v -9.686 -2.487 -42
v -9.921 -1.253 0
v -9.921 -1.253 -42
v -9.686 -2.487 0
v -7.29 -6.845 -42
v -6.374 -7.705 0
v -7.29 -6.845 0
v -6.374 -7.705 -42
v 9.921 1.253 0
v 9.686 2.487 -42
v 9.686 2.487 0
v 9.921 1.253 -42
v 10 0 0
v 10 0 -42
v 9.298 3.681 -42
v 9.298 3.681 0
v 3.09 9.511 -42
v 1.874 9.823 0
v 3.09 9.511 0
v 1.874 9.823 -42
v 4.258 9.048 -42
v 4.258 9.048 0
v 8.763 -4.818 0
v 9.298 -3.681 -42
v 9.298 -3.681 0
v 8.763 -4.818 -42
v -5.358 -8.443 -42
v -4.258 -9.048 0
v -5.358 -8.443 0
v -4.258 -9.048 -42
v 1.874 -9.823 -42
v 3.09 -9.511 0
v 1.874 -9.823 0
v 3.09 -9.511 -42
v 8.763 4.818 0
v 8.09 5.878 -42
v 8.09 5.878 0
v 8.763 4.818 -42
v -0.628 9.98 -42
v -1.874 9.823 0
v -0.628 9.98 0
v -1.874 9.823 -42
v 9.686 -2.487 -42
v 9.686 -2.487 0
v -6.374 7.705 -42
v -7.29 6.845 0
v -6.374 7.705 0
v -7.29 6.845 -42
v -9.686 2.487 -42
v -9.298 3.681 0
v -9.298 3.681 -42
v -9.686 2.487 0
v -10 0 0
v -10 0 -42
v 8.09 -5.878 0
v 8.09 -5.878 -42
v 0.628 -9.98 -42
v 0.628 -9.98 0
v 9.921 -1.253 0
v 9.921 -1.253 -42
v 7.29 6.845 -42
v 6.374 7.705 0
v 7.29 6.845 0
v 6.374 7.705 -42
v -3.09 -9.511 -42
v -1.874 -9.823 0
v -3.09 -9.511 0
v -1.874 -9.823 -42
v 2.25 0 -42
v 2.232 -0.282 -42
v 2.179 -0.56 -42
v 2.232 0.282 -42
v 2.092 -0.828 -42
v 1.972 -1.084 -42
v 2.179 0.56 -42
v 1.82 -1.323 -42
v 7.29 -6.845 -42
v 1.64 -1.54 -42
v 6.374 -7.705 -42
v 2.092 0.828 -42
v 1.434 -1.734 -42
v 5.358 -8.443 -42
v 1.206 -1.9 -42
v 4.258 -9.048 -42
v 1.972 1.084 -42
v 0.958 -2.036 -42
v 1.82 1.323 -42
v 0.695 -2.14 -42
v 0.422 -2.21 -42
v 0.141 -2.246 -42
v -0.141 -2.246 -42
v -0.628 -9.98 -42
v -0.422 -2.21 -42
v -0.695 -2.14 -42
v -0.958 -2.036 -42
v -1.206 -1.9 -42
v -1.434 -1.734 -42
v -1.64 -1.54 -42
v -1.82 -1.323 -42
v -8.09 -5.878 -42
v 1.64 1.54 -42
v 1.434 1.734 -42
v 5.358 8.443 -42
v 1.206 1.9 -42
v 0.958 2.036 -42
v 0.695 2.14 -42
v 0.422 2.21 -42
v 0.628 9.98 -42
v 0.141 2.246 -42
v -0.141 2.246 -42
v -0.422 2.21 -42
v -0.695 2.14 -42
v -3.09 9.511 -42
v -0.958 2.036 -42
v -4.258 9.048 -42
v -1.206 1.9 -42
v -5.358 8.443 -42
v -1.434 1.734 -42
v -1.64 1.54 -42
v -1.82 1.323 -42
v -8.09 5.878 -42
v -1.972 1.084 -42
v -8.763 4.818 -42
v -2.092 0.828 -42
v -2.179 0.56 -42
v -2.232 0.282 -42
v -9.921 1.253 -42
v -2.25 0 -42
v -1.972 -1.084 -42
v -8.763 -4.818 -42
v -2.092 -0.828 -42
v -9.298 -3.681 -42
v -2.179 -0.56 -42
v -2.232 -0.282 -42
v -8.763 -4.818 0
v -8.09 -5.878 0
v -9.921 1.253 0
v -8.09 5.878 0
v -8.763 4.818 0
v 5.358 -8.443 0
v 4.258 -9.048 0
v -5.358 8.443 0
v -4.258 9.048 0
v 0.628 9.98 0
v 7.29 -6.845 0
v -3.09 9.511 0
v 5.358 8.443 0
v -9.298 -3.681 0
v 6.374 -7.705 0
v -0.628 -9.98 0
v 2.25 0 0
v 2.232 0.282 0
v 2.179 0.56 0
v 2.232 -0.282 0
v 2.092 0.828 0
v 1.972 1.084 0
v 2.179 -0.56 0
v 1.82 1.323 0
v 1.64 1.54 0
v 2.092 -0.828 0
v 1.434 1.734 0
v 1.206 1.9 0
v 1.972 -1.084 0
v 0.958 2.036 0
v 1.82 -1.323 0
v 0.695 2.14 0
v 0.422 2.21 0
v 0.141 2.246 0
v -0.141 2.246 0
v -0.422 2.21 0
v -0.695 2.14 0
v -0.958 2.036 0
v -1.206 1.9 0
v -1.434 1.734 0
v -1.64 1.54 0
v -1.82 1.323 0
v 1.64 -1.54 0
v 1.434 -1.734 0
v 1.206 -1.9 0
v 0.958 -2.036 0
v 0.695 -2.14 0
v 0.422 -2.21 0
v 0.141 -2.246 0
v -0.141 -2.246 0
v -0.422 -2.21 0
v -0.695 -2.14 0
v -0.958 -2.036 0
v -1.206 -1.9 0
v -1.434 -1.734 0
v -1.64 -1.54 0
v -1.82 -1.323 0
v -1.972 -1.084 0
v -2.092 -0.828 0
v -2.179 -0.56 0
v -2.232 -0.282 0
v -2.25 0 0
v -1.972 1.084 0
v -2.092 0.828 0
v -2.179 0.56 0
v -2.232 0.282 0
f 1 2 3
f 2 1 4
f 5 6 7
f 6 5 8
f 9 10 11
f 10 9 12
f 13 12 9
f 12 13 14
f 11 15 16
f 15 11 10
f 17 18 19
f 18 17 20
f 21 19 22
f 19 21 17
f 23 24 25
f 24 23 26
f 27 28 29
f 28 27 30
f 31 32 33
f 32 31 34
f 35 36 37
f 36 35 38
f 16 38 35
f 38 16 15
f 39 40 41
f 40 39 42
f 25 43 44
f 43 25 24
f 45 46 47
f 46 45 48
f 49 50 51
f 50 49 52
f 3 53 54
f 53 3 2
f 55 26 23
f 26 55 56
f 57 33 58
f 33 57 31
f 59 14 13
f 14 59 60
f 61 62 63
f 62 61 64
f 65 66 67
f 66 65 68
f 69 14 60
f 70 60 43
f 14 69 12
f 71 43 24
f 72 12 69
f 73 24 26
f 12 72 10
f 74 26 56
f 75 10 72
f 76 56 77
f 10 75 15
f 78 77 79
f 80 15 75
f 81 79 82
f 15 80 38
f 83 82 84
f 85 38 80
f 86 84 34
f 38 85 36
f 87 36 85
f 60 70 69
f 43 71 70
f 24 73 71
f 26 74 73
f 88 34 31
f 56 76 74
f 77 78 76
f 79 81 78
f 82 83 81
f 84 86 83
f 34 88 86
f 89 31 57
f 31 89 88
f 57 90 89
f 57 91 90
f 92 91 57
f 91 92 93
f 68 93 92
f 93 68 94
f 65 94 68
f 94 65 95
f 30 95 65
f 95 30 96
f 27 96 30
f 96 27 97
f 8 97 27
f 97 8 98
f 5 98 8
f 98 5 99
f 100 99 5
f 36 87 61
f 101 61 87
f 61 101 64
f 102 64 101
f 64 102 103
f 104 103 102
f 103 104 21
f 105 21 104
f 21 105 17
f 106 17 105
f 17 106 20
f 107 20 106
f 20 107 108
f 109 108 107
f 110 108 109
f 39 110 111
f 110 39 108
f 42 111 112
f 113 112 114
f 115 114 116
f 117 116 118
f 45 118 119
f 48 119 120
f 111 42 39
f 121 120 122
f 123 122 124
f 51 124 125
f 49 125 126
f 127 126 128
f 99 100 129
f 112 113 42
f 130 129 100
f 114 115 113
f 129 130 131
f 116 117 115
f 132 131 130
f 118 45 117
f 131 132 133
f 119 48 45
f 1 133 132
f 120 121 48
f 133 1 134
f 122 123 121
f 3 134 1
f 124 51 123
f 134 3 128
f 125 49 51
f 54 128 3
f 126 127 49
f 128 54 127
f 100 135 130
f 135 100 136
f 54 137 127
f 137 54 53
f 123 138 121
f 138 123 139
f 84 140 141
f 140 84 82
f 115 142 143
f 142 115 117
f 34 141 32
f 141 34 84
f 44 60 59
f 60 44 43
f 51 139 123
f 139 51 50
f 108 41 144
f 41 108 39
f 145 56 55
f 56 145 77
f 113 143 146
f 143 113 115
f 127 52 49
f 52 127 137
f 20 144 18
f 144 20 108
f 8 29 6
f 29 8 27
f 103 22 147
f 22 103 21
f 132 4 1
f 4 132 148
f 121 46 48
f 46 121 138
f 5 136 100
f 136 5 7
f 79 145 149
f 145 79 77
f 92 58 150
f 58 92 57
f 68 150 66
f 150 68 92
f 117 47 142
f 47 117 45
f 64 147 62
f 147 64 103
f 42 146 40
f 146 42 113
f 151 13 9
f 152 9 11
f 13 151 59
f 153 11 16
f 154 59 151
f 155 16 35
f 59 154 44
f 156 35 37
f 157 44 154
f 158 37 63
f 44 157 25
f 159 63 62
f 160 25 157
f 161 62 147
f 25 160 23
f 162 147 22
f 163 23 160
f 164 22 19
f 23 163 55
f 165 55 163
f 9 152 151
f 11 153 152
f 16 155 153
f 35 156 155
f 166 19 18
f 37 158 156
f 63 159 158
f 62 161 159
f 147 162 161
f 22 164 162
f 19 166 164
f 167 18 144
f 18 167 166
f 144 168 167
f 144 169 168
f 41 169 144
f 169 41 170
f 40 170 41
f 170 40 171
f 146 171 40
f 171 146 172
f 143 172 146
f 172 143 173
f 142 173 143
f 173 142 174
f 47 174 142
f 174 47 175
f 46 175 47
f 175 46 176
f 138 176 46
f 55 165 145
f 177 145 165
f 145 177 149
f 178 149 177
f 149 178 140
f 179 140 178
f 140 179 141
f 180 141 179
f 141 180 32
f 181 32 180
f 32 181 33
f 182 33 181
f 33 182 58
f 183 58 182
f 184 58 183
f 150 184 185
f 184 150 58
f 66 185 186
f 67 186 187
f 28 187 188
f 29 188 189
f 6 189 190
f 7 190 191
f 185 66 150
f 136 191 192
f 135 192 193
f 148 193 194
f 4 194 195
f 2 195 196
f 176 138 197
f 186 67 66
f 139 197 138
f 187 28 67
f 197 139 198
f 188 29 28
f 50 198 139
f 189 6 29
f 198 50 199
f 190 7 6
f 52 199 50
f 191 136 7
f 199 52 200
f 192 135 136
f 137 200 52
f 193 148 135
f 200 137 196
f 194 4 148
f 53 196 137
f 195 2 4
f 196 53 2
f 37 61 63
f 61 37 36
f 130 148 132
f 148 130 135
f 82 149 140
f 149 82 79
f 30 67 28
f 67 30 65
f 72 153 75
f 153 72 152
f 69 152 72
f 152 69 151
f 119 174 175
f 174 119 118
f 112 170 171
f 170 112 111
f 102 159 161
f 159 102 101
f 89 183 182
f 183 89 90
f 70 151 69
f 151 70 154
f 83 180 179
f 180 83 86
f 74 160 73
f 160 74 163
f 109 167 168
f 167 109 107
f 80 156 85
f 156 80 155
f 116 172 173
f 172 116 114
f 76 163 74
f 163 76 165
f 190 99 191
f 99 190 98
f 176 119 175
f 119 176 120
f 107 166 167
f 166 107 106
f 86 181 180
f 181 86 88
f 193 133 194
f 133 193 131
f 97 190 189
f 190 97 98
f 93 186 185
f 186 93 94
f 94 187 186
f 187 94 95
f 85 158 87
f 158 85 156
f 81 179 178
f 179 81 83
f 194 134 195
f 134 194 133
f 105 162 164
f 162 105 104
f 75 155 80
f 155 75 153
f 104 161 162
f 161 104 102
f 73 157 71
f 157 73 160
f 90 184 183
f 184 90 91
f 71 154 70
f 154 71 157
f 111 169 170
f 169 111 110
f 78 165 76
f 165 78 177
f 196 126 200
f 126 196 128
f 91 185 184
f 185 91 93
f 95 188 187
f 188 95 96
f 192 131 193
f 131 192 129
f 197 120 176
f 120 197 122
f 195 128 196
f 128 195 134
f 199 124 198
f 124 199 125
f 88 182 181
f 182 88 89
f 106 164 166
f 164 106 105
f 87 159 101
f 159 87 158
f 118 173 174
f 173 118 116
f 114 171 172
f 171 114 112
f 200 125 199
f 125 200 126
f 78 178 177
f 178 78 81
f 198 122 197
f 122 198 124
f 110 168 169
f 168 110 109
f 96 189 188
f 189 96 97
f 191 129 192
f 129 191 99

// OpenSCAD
$fn = 50;


difference() {
	union() {
		translate(v = [0, 0, -42.0000000000]) {
			cylinder(h = 42, r = 10.0000000000);
		}
		cylinder(h = 0, r = 19.0000000000);
	}
	union() {
		#translate(v = [0, 0, -42]) {
			cylinder(h = 42, r = 2.2500000000);
		}
	}
}
